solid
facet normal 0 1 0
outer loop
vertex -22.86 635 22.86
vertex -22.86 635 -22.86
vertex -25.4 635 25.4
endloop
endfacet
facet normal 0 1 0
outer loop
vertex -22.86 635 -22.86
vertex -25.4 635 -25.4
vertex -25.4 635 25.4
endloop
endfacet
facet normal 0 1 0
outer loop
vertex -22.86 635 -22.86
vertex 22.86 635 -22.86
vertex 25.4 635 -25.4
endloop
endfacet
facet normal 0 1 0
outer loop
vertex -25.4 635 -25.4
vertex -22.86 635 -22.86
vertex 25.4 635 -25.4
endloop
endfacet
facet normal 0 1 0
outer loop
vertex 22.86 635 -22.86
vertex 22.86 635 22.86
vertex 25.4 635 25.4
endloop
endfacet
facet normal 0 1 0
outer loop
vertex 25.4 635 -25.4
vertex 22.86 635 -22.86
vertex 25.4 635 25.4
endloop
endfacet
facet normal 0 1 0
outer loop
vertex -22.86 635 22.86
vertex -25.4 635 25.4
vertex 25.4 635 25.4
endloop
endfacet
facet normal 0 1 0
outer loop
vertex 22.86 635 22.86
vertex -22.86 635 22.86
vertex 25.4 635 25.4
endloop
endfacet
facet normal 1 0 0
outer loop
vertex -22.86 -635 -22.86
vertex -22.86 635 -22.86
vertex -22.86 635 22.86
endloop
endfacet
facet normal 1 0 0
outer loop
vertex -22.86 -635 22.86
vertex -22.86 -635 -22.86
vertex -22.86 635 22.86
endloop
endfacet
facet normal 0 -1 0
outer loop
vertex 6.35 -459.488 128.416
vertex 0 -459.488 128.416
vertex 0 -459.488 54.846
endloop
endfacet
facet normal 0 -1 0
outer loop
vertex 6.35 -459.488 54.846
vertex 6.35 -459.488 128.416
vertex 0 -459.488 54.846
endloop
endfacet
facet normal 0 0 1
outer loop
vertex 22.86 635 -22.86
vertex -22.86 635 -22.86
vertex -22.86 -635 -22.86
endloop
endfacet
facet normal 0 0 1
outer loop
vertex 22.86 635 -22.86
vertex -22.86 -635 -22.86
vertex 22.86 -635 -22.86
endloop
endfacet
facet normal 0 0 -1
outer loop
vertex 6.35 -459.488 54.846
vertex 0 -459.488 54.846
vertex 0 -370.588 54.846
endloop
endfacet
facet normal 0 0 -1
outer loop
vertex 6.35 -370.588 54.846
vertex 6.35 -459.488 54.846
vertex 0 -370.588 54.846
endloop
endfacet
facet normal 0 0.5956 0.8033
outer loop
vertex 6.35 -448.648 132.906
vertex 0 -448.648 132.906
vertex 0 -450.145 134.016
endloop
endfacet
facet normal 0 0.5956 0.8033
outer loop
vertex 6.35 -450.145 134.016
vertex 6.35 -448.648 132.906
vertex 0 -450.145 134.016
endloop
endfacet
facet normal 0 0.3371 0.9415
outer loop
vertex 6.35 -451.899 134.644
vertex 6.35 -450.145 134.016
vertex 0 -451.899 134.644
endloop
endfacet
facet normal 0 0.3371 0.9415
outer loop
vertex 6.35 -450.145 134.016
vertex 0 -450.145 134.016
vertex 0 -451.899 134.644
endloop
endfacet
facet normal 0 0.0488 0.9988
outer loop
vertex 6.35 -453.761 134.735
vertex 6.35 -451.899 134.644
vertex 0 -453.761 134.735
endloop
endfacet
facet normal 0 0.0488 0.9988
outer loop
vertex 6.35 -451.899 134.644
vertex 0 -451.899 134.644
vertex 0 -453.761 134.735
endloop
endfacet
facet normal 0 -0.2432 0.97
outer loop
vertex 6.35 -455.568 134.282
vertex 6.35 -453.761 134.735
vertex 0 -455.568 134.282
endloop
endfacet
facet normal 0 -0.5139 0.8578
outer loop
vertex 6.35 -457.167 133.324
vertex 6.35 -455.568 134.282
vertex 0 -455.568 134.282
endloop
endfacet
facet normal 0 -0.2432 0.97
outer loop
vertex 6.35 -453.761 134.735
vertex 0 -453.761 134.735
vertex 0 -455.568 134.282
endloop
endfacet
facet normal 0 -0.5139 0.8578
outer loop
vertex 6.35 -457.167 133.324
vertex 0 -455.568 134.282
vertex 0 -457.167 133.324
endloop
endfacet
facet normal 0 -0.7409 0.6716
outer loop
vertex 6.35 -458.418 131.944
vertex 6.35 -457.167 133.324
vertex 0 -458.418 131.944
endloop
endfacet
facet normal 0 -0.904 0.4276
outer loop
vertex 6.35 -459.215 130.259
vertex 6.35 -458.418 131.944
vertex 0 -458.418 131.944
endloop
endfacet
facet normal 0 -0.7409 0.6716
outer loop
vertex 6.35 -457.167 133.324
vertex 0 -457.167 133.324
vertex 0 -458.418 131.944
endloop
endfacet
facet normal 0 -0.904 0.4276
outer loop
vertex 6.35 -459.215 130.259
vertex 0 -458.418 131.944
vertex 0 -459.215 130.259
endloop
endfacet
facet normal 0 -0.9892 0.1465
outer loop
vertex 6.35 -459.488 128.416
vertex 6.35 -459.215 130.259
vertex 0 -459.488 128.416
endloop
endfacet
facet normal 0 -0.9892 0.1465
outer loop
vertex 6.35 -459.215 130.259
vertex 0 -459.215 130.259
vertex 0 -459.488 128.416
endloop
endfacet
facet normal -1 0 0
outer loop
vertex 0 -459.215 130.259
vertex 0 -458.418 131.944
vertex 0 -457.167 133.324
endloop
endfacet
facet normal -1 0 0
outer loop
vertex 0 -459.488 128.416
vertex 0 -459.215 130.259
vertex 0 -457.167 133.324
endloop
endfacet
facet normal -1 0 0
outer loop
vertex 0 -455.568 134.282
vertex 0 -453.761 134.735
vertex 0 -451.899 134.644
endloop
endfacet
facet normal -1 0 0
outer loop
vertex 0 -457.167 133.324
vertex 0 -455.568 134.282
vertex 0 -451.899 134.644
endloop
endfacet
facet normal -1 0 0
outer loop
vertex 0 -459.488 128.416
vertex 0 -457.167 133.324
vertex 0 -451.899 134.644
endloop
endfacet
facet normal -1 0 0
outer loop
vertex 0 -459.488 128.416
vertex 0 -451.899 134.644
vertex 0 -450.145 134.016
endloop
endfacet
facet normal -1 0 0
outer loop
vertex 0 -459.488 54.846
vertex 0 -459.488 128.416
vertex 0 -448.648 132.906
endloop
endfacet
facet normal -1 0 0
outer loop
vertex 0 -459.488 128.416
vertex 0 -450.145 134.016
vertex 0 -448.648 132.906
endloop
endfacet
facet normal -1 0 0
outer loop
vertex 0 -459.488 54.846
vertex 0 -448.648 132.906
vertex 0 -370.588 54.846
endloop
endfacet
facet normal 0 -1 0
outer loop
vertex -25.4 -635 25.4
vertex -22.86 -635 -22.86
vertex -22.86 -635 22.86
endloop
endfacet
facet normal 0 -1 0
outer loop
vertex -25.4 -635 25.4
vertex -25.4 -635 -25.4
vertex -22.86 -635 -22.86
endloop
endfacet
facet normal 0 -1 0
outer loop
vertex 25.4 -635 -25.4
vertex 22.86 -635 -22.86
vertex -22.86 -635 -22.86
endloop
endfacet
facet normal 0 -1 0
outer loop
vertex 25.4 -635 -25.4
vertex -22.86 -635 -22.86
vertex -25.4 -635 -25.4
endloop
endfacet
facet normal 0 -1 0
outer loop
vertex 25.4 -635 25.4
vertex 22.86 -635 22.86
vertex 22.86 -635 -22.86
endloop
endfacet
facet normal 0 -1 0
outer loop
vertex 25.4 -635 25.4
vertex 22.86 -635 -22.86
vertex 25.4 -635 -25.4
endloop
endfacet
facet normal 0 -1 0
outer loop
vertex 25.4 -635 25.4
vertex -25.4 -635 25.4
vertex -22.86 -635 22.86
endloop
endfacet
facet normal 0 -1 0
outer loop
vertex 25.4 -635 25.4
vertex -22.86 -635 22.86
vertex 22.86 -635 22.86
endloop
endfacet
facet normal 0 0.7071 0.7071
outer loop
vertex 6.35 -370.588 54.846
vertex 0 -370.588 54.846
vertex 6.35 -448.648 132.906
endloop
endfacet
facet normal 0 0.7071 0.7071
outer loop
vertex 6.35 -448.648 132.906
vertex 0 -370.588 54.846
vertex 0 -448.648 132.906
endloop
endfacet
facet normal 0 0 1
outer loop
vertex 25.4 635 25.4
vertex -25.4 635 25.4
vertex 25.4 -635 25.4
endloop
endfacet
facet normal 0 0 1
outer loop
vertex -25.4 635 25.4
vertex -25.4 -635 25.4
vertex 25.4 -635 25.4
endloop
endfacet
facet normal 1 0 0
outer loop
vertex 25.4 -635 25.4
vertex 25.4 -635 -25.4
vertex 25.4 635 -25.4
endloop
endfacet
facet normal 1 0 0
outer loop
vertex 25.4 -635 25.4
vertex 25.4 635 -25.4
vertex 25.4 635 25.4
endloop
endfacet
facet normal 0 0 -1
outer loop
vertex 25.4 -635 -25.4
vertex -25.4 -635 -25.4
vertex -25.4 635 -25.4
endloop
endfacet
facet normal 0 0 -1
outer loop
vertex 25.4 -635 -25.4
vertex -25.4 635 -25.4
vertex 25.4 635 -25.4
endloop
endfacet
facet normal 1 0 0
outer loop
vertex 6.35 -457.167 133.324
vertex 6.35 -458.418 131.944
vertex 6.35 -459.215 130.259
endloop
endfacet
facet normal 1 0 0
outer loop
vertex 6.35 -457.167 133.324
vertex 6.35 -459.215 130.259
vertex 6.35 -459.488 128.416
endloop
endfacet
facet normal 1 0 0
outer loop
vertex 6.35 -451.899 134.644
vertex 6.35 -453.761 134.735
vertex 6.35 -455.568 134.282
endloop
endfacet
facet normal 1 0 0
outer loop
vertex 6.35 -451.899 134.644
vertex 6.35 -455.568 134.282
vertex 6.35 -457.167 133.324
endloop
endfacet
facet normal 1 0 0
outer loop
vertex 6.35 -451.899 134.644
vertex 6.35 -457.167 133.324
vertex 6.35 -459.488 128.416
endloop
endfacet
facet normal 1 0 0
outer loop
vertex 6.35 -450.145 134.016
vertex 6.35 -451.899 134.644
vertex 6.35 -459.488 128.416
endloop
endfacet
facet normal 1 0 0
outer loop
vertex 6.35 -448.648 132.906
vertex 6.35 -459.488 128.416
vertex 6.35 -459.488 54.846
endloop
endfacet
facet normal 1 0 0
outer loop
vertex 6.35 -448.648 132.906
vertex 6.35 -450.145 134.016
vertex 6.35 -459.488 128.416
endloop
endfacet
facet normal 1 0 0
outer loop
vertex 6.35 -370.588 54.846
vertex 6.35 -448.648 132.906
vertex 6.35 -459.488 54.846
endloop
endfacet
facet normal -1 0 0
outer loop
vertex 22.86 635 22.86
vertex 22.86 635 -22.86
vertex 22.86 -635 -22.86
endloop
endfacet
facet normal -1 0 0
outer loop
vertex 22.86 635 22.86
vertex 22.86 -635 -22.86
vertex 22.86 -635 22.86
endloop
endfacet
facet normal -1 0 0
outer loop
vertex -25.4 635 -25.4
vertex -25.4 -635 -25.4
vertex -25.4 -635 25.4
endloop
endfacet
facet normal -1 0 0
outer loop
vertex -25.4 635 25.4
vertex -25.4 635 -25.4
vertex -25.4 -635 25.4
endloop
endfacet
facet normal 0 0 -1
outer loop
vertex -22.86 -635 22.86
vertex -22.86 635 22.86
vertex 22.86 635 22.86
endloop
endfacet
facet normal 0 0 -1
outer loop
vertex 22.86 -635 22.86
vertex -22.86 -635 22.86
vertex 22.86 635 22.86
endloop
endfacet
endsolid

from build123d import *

# Parameters (mm, degrees)
F0_W     = 50.8
F0_H     = 50.8
F1_DEPTH = 635
F2_T     = -2.54
F4_DEPTH = 6.35


with BuildPart() as f1:
    # F0 (on Front) → F1 (new body, symmetric)
    with BuildSketch(Plane.XZ):
        Rectangle(F0_W, F0_H)
    extrude(amount=F1_DEPTH, both=True)

    # F2
    f2_openings = [f1.faces().sort_by_distance(p)[0] for p in [
        (0, -635, 0),
        (0, 635, 0),
    ]]
    offset(amount=F2_T, openings=f2_openings)


with BuildPart() as f4:
    # F3 (on Right) → F4 (new body)
    with BuildSketch(Plane.YZ):
        with BuildLine():
            ThreePointArc((-448.648115, 132.905924), (-455.568283, 134.282431), (-459.488243, 128.415796))
            Line((-459.488243, 128.415796), (-459.488243, 54.846052))
            Line((-459.488243, 54.846052), (-370.588243, 54.846052))
            Line((-370.588243, 54.846052), (-448.648115, 132.905924))
        make_face()
    extrude(amount=F4_DEPTH)


solid = Compound([f1.part, f4.part])
